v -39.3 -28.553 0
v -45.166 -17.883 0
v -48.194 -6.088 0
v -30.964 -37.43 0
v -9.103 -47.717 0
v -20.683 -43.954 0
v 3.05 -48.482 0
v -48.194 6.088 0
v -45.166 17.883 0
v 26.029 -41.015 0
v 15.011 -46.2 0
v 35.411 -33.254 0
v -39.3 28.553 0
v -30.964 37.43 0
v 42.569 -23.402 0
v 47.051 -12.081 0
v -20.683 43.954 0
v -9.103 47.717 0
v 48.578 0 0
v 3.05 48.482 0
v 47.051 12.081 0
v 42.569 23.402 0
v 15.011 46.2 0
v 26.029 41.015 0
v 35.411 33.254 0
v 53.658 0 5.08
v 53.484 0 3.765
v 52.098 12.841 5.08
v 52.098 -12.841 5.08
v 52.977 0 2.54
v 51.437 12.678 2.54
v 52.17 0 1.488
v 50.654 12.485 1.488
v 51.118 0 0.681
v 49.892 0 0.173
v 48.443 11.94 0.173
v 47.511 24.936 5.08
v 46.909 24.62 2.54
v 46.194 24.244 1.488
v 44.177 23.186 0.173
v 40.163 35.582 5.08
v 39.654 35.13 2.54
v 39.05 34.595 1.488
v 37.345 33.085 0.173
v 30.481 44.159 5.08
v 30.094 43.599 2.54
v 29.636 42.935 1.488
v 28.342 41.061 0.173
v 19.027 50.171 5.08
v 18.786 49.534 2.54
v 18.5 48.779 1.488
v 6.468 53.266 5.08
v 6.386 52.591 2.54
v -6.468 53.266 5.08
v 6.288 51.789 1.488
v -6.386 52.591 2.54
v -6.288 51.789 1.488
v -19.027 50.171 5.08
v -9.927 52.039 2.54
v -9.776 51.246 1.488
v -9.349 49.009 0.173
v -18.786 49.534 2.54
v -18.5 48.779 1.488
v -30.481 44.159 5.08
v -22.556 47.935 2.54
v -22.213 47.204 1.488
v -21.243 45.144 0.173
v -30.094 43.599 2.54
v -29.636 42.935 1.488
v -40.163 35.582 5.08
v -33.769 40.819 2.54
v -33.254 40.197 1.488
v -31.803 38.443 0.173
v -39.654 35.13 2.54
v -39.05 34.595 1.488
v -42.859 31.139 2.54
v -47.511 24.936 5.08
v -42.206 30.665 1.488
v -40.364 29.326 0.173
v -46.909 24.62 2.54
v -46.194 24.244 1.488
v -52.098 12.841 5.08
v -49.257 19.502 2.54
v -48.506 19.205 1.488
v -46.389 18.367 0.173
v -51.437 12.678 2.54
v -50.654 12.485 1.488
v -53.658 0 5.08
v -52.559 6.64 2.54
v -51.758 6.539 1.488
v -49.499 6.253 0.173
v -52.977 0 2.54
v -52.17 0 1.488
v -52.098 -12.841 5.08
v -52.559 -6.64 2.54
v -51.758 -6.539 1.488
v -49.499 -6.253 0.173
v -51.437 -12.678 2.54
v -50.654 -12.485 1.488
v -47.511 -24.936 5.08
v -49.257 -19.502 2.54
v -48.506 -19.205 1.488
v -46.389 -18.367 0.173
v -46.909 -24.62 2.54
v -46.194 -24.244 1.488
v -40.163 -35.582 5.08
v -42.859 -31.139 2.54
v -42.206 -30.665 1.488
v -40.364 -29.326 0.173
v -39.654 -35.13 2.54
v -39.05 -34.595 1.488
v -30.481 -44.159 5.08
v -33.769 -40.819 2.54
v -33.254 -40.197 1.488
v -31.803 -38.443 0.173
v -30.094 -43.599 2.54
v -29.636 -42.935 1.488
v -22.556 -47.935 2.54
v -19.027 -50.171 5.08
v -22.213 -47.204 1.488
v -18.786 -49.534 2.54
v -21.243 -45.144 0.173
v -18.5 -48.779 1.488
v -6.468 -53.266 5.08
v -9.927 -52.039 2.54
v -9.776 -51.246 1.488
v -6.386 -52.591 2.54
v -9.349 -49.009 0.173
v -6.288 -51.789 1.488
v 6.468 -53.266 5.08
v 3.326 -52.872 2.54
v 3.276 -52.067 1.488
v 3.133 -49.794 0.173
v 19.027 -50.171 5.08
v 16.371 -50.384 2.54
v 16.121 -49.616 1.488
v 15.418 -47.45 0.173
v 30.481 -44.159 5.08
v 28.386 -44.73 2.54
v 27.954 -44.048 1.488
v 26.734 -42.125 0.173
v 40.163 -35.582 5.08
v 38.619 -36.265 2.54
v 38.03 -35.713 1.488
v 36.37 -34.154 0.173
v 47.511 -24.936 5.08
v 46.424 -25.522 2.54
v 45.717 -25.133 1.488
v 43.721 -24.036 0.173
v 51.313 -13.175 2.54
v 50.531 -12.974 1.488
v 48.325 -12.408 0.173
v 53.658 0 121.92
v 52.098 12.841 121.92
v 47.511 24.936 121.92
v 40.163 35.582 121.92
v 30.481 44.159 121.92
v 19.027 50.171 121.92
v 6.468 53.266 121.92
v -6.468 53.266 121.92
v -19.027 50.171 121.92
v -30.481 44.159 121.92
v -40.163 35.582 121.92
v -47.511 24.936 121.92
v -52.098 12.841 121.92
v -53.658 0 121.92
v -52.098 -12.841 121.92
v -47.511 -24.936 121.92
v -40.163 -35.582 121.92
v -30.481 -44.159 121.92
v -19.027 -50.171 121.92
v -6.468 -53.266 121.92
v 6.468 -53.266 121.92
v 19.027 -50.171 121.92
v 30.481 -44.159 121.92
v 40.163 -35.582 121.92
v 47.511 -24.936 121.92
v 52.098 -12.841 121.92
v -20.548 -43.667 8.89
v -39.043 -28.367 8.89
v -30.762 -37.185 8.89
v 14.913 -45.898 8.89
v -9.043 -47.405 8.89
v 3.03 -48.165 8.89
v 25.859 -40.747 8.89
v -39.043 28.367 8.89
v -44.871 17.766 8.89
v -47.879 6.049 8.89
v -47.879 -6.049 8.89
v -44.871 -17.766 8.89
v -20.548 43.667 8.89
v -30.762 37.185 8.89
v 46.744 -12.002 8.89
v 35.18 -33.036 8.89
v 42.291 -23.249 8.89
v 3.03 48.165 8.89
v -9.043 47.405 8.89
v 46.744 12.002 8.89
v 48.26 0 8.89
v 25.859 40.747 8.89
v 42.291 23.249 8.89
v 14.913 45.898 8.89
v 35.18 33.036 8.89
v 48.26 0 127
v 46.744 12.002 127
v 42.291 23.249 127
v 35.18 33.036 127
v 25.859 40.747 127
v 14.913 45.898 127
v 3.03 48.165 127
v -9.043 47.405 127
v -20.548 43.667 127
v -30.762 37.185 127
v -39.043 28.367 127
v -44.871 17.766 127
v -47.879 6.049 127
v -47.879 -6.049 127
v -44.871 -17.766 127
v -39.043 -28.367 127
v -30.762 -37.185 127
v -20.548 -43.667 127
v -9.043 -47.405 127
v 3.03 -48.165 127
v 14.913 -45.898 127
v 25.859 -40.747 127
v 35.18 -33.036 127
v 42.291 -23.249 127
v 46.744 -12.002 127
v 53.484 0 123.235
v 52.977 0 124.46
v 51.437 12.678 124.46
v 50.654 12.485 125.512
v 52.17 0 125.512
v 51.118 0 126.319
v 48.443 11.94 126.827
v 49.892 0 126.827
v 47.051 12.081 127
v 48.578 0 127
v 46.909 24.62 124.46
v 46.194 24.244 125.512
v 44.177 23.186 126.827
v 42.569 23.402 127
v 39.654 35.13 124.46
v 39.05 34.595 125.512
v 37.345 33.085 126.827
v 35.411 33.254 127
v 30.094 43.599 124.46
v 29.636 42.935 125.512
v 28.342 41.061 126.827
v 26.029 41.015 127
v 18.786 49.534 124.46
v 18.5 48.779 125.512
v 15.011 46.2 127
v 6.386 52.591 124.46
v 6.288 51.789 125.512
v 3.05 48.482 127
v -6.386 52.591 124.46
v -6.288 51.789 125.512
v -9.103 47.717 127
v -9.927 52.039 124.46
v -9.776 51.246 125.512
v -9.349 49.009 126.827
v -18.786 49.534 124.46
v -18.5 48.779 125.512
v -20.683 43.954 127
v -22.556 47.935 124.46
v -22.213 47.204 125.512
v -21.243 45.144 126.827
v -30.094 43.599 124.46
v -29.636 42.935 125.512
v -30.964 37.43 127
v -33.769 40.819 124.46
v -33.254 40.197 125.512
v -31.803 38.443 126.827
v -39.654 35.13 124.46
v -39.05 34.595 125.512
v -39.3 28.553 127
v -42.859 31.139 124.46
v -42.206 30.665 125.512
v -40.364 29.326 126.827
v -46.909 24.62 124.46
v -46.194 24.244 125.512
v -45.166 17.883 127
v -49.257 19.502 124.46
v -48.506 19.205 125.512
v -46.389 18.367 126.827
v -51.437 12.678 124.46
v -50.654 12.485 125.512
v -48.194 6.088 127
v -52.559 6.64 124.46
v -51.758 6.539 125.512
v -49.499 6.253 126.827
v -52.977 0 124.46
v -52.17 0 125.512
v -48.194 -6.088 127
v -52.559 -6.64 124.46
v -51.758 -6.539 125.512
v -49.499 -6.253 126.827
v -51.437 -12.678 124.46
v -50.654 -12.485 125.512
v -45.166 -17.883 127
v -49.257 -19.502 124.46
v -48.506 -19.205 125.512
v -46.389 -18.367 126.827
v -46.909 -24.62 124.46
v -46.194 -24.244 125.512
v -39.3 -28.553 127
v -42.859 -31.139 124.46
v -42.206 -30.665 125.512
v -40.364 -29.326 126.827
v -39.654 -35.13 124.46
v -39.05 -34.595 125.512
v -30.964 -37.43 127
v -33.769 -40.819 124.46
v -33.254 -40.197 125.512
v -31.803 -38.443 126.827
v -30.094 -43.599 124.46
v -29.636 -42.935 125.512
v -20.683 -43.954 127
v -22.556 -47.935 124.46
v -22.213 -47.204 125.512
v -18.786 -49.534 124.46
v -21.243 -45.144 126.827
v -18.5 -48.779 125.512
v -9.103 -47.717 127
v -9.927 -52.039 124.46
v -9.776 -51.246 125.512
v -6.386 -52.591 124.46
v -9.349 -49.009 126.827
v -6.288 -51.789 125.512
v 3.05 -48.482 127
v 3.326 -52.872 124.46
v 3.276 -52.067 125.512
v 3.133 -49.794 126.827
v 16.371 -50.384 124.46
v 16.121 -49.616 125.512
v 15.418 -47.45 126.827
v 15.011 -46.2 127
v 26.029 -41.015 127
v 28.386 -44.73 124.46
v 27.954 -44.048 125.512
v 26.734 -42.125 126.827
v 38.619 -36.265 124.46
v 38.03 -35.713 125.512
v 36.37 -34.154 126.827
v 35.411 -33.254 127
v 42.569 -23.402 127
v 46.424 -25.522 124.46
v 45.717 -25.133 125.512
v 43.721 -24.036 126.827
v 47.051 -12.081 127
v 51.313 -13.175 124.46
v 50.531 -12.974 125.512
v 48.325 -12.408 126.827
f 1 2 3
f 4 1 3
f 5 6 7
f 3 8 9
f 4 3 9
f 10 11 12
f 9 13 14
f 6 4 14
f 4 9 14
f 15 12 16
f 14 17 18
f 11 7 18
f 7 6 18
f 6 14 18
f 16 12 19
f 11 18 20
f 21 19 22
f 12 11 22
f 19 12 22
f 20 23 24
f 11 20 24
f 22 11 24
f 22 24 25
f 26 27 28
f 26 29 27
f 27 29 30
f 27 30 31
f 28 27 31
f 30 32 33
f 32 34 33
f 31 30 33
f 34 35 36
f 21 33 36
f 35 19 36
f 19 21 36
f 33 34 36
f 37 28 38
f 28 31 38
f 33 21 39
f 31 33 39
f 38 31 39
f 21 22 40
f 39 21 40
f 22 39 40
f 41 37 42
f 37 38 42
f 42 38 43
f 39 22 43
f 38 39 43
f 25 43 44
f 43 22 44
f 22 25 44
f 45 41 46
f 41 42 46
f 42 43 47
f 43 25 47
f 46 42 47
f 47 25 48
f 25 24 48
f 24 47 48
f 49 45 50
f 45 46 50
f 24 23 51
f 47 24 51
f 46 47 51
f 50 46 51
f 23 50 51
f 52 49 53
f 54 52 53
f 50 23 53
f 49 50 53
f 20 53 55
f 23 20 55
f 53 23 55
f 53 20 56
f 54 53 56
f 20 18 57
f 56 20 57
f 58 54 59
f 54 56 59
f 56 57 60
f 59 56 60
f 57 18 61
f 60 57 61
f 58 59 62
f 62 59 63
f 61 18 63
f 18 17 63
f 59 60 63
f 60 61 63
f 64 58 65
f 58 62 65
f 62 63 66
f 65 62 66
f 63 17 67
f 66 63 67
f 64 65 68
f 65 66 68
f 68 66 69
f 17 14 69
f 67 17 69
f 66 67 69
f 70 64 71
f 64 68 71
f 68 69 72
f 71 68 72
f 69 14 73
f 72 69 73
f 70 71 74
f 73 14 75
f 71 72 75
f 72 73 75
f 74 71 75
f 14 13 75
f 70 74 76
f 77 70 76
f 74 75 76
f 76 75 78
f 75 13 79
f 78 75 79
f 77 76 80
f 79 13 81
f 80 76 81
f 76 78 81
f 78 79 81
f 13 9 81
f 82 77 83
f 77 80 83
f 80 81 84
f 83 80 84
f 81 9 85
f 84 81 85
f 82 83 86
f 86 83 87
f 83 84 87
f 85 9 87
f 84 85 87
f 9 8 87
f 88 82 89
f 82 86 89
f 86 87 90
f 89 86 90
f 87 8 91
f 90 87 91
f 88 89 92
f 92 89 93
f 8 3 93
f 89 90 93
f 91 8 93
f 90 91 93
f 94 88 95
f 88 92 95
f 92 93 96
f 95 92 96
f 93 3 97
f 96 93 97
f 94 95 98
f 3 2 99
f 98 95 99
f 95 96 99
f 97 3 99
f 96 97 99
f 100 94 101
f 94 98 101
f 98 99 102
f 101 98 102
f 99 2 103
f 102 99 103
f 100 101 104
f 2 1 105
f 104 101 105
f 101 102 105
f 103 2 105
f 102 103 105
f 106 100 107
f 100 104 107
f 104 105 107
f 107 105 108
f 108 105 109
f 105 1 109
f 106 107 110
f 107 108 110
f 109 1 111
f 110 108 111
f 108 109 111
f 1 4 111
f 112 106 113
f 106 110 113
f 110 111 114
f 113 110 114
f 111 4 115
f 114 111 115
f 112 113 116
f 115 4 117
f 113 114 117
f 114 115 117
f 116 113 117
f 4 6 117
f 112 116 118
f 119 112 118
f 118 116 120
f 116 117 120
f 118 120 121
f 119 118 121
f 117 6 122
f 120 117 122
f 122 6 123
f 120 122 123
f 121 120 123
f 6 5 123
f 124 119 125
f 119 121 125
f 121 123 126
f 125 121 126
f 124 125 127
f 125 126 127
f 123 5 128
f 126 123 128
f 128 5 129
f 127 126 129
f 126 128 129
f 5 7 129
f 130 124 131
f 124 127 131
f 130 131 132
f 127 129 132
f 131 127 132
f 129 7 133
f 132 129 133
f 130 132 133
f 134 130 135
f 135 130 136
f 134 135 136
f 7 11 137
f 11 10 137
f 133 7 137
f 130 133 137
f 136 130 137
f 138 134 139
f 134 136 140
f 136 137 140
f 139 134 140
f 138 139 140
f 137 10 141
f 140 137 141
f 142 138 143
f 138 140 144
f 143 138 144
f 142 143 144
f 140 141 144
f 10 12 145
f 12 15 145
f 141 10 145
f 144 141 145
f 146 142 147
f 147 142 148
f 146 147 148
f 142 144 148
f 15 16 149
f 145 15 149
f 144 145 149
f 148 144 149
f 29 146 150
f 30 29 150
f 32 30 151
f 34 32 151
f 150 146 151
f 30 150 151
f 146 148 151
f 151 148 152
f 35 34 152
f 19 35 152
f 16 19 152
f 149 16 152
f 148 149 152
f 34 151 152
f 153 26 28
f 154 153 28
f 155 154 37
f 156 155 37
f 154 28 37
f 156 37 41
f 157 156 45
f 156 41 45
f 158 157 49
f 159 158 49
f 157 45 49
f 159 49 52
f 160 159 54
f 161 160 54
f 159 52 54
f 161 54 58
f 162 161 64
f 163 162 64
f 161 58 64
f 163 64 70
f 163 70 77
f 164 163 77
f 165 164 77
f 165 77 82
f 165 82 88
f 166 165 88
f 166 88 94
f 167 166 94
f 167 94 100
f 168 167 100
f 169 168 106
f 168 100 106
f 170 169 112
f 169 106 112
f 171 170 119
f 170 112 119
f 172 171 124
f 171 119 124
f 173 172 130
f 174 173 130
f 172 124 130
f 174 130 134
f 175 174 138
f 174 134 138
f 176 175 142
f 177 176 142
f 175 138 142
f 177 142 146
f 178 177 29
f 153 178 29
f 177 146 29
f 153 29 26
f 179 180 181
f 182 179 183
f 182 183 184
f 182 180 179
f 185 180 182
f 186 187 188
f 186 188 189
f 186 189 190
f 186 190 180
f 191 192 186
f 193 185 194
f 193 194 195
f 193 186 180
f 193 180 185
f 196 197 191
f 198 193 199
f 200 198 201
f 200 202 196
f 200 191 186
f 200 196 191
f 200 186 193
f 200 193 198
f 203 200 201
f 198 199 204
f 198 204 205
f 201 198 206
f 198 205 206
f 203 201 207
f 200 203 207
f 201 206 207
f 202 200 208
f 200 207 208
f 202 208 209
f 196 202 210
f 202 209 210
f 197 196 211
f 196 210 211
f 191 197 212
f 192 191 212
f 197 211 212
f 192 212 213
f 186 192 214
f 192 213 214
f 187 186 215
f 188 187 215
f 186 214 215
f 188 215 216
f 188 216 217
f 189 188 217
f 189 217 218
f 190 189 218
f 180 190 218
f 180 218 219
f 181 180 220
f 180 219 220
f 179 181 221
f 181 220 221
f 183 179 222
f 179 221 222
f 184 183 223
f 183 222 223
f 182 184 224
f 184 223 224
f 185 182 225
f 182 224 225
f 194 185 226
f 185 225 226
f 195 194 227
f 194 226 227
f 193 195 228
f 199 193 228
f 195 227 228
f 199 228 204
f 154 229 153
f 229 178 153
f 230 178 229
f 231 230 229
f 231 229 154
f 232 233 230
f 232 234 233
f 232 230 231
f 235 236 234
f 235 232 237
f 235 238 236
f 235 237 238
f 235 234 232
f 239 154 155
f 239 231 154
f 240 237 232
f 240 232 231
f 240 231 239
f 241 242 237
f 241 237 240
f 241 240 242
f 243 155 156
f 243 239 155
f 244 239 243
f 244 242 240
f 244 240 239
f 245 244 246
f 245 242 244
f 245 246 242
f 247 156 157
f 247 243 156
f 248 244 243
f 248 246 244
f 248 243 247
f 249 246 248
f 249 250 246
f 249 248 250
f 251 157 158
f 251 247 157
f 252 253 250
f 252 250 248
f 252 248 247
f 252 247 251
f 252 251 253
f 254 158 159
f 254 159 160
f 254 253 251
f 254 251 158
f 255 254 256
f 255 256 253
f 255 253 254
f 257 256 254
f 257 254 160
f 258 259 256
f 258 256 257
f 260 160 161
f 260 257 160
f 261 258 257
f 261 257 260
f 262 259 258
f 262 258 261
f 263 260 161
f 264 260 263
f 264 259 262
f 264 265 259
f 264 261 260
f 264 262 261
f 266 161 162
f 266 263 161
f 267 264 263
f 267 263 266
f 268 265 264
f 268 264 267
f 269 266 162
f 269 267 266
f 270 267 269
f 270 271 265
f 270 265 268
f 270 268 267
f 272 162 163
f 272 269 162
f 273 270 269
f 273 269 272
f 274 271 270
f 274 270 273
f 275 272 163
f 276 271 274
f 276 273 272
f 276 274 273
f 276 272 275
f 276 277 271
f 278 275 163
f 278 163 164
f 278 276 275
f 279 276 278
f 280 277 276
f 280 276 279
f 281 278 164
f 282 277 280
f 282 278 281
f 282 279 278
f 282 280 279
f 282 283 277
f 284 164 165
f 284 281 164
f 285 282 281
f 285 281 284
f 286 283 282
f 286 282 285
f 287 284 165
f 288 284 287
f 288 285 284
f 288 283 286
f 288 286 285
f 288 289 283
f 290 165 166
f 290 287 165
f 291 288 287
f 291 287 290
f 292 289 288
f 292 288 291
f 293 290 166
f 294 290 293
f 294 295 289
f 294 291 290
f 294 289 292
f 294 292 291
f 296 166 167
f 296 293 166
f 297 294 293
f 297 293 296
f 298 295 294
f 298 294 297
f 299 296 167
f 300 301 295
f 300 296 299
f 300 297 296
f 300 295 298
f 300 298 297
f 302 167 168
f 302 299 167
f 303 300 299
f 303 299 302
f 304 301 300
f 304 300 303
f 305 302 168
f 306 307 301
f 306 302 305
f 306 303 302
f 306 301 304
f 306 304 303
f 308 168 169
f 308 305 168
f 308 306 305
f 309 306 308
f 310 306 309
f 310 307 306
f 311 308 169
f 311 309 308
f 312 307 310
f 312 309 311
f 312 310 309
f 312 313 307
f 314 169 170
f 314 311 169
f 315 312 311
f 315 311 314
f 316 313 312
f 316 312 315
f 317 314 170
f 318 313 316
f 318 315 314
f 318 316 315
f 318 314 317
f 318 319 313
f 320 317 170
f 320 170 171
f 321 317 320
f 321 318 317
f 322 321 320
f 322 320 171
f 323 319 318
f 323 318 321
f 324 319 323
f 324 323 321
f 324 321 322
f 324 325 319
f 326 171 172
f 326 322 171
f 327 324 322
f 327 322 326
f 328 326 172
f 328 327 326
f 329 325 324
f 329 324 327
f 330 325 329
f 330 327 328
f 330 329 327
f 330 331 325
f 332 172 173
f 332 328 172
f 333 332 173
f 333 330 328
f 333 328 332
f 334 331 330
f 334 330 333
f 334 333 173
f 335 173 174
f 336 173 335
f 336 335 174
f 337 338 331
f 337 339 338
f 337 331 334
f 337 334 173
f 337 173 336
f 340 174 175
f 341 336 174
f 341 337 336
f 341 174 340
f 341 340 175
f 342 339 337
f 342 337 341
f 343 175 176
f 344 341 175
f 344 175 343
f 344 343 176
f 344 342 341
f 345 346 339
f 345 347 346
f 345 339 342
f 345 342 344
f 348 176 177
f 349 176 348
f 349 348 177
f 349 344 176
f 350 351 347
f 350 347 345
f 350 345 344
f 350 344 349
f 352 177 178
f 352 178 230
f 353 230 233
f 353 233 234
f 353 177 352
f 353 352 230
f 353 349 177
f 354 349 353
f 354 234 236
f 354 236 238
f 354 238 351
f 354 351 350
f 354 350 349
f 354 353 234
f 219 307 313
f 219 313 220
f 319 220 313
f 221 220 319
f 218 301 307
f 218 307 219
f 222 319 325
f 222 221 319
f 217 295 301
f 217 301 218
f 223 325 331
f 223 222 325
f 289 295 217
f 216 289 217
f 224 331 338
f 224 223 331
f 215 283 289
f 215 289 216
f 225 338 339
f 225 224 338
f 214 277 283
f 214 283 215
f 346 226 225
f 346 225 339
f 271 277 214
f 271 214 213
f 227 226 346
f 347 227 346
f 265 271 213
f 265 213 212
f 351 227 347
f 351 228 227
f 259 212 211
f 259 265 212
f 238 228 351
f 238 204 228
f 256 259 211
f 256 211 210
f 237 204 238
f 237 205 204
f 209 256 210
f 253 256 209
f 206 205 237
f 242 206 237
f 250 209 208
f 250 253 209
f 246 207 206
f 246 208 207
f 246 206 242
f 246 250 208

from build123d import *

# Parameters (mm, degrees)
F0_R     = 53.6575
F1_DEPTH = 127
F2_R     = 48.26
F3_DEPTH = 118.11
F4_R     = 5.08
F5_R     = 5.08


with BuildPart() as f1:
    # F0 (on Top) → F1 (new body)
    with BuildSketch(Plane.XY):
        Circle(F0_R)
    extrude(amount=F1_DEPTH)

    # F2 (on face) → F3 (cut)
    with BuildSketch(Plane.XY.offset(127)):
        Circle(F2_R)
    extrude(amount=-F3_DEPTH, mode=Mode.SUBTRACT)

    # F4
    f4_edges = [f1.edges().sort_by_distance(p)[0] for p in [
        (-53.6575, 0, 127),
    ]]
    fillet(f4_edges, radius=F4_R)

    # F5
    f5_edges = [f1.edges().sort_by_distance(p)[0] for p in [
        (-53.6575, 0, 0),
    ]]
    fillet(f5_edges, radius=F5_R)


solid = f1.part
